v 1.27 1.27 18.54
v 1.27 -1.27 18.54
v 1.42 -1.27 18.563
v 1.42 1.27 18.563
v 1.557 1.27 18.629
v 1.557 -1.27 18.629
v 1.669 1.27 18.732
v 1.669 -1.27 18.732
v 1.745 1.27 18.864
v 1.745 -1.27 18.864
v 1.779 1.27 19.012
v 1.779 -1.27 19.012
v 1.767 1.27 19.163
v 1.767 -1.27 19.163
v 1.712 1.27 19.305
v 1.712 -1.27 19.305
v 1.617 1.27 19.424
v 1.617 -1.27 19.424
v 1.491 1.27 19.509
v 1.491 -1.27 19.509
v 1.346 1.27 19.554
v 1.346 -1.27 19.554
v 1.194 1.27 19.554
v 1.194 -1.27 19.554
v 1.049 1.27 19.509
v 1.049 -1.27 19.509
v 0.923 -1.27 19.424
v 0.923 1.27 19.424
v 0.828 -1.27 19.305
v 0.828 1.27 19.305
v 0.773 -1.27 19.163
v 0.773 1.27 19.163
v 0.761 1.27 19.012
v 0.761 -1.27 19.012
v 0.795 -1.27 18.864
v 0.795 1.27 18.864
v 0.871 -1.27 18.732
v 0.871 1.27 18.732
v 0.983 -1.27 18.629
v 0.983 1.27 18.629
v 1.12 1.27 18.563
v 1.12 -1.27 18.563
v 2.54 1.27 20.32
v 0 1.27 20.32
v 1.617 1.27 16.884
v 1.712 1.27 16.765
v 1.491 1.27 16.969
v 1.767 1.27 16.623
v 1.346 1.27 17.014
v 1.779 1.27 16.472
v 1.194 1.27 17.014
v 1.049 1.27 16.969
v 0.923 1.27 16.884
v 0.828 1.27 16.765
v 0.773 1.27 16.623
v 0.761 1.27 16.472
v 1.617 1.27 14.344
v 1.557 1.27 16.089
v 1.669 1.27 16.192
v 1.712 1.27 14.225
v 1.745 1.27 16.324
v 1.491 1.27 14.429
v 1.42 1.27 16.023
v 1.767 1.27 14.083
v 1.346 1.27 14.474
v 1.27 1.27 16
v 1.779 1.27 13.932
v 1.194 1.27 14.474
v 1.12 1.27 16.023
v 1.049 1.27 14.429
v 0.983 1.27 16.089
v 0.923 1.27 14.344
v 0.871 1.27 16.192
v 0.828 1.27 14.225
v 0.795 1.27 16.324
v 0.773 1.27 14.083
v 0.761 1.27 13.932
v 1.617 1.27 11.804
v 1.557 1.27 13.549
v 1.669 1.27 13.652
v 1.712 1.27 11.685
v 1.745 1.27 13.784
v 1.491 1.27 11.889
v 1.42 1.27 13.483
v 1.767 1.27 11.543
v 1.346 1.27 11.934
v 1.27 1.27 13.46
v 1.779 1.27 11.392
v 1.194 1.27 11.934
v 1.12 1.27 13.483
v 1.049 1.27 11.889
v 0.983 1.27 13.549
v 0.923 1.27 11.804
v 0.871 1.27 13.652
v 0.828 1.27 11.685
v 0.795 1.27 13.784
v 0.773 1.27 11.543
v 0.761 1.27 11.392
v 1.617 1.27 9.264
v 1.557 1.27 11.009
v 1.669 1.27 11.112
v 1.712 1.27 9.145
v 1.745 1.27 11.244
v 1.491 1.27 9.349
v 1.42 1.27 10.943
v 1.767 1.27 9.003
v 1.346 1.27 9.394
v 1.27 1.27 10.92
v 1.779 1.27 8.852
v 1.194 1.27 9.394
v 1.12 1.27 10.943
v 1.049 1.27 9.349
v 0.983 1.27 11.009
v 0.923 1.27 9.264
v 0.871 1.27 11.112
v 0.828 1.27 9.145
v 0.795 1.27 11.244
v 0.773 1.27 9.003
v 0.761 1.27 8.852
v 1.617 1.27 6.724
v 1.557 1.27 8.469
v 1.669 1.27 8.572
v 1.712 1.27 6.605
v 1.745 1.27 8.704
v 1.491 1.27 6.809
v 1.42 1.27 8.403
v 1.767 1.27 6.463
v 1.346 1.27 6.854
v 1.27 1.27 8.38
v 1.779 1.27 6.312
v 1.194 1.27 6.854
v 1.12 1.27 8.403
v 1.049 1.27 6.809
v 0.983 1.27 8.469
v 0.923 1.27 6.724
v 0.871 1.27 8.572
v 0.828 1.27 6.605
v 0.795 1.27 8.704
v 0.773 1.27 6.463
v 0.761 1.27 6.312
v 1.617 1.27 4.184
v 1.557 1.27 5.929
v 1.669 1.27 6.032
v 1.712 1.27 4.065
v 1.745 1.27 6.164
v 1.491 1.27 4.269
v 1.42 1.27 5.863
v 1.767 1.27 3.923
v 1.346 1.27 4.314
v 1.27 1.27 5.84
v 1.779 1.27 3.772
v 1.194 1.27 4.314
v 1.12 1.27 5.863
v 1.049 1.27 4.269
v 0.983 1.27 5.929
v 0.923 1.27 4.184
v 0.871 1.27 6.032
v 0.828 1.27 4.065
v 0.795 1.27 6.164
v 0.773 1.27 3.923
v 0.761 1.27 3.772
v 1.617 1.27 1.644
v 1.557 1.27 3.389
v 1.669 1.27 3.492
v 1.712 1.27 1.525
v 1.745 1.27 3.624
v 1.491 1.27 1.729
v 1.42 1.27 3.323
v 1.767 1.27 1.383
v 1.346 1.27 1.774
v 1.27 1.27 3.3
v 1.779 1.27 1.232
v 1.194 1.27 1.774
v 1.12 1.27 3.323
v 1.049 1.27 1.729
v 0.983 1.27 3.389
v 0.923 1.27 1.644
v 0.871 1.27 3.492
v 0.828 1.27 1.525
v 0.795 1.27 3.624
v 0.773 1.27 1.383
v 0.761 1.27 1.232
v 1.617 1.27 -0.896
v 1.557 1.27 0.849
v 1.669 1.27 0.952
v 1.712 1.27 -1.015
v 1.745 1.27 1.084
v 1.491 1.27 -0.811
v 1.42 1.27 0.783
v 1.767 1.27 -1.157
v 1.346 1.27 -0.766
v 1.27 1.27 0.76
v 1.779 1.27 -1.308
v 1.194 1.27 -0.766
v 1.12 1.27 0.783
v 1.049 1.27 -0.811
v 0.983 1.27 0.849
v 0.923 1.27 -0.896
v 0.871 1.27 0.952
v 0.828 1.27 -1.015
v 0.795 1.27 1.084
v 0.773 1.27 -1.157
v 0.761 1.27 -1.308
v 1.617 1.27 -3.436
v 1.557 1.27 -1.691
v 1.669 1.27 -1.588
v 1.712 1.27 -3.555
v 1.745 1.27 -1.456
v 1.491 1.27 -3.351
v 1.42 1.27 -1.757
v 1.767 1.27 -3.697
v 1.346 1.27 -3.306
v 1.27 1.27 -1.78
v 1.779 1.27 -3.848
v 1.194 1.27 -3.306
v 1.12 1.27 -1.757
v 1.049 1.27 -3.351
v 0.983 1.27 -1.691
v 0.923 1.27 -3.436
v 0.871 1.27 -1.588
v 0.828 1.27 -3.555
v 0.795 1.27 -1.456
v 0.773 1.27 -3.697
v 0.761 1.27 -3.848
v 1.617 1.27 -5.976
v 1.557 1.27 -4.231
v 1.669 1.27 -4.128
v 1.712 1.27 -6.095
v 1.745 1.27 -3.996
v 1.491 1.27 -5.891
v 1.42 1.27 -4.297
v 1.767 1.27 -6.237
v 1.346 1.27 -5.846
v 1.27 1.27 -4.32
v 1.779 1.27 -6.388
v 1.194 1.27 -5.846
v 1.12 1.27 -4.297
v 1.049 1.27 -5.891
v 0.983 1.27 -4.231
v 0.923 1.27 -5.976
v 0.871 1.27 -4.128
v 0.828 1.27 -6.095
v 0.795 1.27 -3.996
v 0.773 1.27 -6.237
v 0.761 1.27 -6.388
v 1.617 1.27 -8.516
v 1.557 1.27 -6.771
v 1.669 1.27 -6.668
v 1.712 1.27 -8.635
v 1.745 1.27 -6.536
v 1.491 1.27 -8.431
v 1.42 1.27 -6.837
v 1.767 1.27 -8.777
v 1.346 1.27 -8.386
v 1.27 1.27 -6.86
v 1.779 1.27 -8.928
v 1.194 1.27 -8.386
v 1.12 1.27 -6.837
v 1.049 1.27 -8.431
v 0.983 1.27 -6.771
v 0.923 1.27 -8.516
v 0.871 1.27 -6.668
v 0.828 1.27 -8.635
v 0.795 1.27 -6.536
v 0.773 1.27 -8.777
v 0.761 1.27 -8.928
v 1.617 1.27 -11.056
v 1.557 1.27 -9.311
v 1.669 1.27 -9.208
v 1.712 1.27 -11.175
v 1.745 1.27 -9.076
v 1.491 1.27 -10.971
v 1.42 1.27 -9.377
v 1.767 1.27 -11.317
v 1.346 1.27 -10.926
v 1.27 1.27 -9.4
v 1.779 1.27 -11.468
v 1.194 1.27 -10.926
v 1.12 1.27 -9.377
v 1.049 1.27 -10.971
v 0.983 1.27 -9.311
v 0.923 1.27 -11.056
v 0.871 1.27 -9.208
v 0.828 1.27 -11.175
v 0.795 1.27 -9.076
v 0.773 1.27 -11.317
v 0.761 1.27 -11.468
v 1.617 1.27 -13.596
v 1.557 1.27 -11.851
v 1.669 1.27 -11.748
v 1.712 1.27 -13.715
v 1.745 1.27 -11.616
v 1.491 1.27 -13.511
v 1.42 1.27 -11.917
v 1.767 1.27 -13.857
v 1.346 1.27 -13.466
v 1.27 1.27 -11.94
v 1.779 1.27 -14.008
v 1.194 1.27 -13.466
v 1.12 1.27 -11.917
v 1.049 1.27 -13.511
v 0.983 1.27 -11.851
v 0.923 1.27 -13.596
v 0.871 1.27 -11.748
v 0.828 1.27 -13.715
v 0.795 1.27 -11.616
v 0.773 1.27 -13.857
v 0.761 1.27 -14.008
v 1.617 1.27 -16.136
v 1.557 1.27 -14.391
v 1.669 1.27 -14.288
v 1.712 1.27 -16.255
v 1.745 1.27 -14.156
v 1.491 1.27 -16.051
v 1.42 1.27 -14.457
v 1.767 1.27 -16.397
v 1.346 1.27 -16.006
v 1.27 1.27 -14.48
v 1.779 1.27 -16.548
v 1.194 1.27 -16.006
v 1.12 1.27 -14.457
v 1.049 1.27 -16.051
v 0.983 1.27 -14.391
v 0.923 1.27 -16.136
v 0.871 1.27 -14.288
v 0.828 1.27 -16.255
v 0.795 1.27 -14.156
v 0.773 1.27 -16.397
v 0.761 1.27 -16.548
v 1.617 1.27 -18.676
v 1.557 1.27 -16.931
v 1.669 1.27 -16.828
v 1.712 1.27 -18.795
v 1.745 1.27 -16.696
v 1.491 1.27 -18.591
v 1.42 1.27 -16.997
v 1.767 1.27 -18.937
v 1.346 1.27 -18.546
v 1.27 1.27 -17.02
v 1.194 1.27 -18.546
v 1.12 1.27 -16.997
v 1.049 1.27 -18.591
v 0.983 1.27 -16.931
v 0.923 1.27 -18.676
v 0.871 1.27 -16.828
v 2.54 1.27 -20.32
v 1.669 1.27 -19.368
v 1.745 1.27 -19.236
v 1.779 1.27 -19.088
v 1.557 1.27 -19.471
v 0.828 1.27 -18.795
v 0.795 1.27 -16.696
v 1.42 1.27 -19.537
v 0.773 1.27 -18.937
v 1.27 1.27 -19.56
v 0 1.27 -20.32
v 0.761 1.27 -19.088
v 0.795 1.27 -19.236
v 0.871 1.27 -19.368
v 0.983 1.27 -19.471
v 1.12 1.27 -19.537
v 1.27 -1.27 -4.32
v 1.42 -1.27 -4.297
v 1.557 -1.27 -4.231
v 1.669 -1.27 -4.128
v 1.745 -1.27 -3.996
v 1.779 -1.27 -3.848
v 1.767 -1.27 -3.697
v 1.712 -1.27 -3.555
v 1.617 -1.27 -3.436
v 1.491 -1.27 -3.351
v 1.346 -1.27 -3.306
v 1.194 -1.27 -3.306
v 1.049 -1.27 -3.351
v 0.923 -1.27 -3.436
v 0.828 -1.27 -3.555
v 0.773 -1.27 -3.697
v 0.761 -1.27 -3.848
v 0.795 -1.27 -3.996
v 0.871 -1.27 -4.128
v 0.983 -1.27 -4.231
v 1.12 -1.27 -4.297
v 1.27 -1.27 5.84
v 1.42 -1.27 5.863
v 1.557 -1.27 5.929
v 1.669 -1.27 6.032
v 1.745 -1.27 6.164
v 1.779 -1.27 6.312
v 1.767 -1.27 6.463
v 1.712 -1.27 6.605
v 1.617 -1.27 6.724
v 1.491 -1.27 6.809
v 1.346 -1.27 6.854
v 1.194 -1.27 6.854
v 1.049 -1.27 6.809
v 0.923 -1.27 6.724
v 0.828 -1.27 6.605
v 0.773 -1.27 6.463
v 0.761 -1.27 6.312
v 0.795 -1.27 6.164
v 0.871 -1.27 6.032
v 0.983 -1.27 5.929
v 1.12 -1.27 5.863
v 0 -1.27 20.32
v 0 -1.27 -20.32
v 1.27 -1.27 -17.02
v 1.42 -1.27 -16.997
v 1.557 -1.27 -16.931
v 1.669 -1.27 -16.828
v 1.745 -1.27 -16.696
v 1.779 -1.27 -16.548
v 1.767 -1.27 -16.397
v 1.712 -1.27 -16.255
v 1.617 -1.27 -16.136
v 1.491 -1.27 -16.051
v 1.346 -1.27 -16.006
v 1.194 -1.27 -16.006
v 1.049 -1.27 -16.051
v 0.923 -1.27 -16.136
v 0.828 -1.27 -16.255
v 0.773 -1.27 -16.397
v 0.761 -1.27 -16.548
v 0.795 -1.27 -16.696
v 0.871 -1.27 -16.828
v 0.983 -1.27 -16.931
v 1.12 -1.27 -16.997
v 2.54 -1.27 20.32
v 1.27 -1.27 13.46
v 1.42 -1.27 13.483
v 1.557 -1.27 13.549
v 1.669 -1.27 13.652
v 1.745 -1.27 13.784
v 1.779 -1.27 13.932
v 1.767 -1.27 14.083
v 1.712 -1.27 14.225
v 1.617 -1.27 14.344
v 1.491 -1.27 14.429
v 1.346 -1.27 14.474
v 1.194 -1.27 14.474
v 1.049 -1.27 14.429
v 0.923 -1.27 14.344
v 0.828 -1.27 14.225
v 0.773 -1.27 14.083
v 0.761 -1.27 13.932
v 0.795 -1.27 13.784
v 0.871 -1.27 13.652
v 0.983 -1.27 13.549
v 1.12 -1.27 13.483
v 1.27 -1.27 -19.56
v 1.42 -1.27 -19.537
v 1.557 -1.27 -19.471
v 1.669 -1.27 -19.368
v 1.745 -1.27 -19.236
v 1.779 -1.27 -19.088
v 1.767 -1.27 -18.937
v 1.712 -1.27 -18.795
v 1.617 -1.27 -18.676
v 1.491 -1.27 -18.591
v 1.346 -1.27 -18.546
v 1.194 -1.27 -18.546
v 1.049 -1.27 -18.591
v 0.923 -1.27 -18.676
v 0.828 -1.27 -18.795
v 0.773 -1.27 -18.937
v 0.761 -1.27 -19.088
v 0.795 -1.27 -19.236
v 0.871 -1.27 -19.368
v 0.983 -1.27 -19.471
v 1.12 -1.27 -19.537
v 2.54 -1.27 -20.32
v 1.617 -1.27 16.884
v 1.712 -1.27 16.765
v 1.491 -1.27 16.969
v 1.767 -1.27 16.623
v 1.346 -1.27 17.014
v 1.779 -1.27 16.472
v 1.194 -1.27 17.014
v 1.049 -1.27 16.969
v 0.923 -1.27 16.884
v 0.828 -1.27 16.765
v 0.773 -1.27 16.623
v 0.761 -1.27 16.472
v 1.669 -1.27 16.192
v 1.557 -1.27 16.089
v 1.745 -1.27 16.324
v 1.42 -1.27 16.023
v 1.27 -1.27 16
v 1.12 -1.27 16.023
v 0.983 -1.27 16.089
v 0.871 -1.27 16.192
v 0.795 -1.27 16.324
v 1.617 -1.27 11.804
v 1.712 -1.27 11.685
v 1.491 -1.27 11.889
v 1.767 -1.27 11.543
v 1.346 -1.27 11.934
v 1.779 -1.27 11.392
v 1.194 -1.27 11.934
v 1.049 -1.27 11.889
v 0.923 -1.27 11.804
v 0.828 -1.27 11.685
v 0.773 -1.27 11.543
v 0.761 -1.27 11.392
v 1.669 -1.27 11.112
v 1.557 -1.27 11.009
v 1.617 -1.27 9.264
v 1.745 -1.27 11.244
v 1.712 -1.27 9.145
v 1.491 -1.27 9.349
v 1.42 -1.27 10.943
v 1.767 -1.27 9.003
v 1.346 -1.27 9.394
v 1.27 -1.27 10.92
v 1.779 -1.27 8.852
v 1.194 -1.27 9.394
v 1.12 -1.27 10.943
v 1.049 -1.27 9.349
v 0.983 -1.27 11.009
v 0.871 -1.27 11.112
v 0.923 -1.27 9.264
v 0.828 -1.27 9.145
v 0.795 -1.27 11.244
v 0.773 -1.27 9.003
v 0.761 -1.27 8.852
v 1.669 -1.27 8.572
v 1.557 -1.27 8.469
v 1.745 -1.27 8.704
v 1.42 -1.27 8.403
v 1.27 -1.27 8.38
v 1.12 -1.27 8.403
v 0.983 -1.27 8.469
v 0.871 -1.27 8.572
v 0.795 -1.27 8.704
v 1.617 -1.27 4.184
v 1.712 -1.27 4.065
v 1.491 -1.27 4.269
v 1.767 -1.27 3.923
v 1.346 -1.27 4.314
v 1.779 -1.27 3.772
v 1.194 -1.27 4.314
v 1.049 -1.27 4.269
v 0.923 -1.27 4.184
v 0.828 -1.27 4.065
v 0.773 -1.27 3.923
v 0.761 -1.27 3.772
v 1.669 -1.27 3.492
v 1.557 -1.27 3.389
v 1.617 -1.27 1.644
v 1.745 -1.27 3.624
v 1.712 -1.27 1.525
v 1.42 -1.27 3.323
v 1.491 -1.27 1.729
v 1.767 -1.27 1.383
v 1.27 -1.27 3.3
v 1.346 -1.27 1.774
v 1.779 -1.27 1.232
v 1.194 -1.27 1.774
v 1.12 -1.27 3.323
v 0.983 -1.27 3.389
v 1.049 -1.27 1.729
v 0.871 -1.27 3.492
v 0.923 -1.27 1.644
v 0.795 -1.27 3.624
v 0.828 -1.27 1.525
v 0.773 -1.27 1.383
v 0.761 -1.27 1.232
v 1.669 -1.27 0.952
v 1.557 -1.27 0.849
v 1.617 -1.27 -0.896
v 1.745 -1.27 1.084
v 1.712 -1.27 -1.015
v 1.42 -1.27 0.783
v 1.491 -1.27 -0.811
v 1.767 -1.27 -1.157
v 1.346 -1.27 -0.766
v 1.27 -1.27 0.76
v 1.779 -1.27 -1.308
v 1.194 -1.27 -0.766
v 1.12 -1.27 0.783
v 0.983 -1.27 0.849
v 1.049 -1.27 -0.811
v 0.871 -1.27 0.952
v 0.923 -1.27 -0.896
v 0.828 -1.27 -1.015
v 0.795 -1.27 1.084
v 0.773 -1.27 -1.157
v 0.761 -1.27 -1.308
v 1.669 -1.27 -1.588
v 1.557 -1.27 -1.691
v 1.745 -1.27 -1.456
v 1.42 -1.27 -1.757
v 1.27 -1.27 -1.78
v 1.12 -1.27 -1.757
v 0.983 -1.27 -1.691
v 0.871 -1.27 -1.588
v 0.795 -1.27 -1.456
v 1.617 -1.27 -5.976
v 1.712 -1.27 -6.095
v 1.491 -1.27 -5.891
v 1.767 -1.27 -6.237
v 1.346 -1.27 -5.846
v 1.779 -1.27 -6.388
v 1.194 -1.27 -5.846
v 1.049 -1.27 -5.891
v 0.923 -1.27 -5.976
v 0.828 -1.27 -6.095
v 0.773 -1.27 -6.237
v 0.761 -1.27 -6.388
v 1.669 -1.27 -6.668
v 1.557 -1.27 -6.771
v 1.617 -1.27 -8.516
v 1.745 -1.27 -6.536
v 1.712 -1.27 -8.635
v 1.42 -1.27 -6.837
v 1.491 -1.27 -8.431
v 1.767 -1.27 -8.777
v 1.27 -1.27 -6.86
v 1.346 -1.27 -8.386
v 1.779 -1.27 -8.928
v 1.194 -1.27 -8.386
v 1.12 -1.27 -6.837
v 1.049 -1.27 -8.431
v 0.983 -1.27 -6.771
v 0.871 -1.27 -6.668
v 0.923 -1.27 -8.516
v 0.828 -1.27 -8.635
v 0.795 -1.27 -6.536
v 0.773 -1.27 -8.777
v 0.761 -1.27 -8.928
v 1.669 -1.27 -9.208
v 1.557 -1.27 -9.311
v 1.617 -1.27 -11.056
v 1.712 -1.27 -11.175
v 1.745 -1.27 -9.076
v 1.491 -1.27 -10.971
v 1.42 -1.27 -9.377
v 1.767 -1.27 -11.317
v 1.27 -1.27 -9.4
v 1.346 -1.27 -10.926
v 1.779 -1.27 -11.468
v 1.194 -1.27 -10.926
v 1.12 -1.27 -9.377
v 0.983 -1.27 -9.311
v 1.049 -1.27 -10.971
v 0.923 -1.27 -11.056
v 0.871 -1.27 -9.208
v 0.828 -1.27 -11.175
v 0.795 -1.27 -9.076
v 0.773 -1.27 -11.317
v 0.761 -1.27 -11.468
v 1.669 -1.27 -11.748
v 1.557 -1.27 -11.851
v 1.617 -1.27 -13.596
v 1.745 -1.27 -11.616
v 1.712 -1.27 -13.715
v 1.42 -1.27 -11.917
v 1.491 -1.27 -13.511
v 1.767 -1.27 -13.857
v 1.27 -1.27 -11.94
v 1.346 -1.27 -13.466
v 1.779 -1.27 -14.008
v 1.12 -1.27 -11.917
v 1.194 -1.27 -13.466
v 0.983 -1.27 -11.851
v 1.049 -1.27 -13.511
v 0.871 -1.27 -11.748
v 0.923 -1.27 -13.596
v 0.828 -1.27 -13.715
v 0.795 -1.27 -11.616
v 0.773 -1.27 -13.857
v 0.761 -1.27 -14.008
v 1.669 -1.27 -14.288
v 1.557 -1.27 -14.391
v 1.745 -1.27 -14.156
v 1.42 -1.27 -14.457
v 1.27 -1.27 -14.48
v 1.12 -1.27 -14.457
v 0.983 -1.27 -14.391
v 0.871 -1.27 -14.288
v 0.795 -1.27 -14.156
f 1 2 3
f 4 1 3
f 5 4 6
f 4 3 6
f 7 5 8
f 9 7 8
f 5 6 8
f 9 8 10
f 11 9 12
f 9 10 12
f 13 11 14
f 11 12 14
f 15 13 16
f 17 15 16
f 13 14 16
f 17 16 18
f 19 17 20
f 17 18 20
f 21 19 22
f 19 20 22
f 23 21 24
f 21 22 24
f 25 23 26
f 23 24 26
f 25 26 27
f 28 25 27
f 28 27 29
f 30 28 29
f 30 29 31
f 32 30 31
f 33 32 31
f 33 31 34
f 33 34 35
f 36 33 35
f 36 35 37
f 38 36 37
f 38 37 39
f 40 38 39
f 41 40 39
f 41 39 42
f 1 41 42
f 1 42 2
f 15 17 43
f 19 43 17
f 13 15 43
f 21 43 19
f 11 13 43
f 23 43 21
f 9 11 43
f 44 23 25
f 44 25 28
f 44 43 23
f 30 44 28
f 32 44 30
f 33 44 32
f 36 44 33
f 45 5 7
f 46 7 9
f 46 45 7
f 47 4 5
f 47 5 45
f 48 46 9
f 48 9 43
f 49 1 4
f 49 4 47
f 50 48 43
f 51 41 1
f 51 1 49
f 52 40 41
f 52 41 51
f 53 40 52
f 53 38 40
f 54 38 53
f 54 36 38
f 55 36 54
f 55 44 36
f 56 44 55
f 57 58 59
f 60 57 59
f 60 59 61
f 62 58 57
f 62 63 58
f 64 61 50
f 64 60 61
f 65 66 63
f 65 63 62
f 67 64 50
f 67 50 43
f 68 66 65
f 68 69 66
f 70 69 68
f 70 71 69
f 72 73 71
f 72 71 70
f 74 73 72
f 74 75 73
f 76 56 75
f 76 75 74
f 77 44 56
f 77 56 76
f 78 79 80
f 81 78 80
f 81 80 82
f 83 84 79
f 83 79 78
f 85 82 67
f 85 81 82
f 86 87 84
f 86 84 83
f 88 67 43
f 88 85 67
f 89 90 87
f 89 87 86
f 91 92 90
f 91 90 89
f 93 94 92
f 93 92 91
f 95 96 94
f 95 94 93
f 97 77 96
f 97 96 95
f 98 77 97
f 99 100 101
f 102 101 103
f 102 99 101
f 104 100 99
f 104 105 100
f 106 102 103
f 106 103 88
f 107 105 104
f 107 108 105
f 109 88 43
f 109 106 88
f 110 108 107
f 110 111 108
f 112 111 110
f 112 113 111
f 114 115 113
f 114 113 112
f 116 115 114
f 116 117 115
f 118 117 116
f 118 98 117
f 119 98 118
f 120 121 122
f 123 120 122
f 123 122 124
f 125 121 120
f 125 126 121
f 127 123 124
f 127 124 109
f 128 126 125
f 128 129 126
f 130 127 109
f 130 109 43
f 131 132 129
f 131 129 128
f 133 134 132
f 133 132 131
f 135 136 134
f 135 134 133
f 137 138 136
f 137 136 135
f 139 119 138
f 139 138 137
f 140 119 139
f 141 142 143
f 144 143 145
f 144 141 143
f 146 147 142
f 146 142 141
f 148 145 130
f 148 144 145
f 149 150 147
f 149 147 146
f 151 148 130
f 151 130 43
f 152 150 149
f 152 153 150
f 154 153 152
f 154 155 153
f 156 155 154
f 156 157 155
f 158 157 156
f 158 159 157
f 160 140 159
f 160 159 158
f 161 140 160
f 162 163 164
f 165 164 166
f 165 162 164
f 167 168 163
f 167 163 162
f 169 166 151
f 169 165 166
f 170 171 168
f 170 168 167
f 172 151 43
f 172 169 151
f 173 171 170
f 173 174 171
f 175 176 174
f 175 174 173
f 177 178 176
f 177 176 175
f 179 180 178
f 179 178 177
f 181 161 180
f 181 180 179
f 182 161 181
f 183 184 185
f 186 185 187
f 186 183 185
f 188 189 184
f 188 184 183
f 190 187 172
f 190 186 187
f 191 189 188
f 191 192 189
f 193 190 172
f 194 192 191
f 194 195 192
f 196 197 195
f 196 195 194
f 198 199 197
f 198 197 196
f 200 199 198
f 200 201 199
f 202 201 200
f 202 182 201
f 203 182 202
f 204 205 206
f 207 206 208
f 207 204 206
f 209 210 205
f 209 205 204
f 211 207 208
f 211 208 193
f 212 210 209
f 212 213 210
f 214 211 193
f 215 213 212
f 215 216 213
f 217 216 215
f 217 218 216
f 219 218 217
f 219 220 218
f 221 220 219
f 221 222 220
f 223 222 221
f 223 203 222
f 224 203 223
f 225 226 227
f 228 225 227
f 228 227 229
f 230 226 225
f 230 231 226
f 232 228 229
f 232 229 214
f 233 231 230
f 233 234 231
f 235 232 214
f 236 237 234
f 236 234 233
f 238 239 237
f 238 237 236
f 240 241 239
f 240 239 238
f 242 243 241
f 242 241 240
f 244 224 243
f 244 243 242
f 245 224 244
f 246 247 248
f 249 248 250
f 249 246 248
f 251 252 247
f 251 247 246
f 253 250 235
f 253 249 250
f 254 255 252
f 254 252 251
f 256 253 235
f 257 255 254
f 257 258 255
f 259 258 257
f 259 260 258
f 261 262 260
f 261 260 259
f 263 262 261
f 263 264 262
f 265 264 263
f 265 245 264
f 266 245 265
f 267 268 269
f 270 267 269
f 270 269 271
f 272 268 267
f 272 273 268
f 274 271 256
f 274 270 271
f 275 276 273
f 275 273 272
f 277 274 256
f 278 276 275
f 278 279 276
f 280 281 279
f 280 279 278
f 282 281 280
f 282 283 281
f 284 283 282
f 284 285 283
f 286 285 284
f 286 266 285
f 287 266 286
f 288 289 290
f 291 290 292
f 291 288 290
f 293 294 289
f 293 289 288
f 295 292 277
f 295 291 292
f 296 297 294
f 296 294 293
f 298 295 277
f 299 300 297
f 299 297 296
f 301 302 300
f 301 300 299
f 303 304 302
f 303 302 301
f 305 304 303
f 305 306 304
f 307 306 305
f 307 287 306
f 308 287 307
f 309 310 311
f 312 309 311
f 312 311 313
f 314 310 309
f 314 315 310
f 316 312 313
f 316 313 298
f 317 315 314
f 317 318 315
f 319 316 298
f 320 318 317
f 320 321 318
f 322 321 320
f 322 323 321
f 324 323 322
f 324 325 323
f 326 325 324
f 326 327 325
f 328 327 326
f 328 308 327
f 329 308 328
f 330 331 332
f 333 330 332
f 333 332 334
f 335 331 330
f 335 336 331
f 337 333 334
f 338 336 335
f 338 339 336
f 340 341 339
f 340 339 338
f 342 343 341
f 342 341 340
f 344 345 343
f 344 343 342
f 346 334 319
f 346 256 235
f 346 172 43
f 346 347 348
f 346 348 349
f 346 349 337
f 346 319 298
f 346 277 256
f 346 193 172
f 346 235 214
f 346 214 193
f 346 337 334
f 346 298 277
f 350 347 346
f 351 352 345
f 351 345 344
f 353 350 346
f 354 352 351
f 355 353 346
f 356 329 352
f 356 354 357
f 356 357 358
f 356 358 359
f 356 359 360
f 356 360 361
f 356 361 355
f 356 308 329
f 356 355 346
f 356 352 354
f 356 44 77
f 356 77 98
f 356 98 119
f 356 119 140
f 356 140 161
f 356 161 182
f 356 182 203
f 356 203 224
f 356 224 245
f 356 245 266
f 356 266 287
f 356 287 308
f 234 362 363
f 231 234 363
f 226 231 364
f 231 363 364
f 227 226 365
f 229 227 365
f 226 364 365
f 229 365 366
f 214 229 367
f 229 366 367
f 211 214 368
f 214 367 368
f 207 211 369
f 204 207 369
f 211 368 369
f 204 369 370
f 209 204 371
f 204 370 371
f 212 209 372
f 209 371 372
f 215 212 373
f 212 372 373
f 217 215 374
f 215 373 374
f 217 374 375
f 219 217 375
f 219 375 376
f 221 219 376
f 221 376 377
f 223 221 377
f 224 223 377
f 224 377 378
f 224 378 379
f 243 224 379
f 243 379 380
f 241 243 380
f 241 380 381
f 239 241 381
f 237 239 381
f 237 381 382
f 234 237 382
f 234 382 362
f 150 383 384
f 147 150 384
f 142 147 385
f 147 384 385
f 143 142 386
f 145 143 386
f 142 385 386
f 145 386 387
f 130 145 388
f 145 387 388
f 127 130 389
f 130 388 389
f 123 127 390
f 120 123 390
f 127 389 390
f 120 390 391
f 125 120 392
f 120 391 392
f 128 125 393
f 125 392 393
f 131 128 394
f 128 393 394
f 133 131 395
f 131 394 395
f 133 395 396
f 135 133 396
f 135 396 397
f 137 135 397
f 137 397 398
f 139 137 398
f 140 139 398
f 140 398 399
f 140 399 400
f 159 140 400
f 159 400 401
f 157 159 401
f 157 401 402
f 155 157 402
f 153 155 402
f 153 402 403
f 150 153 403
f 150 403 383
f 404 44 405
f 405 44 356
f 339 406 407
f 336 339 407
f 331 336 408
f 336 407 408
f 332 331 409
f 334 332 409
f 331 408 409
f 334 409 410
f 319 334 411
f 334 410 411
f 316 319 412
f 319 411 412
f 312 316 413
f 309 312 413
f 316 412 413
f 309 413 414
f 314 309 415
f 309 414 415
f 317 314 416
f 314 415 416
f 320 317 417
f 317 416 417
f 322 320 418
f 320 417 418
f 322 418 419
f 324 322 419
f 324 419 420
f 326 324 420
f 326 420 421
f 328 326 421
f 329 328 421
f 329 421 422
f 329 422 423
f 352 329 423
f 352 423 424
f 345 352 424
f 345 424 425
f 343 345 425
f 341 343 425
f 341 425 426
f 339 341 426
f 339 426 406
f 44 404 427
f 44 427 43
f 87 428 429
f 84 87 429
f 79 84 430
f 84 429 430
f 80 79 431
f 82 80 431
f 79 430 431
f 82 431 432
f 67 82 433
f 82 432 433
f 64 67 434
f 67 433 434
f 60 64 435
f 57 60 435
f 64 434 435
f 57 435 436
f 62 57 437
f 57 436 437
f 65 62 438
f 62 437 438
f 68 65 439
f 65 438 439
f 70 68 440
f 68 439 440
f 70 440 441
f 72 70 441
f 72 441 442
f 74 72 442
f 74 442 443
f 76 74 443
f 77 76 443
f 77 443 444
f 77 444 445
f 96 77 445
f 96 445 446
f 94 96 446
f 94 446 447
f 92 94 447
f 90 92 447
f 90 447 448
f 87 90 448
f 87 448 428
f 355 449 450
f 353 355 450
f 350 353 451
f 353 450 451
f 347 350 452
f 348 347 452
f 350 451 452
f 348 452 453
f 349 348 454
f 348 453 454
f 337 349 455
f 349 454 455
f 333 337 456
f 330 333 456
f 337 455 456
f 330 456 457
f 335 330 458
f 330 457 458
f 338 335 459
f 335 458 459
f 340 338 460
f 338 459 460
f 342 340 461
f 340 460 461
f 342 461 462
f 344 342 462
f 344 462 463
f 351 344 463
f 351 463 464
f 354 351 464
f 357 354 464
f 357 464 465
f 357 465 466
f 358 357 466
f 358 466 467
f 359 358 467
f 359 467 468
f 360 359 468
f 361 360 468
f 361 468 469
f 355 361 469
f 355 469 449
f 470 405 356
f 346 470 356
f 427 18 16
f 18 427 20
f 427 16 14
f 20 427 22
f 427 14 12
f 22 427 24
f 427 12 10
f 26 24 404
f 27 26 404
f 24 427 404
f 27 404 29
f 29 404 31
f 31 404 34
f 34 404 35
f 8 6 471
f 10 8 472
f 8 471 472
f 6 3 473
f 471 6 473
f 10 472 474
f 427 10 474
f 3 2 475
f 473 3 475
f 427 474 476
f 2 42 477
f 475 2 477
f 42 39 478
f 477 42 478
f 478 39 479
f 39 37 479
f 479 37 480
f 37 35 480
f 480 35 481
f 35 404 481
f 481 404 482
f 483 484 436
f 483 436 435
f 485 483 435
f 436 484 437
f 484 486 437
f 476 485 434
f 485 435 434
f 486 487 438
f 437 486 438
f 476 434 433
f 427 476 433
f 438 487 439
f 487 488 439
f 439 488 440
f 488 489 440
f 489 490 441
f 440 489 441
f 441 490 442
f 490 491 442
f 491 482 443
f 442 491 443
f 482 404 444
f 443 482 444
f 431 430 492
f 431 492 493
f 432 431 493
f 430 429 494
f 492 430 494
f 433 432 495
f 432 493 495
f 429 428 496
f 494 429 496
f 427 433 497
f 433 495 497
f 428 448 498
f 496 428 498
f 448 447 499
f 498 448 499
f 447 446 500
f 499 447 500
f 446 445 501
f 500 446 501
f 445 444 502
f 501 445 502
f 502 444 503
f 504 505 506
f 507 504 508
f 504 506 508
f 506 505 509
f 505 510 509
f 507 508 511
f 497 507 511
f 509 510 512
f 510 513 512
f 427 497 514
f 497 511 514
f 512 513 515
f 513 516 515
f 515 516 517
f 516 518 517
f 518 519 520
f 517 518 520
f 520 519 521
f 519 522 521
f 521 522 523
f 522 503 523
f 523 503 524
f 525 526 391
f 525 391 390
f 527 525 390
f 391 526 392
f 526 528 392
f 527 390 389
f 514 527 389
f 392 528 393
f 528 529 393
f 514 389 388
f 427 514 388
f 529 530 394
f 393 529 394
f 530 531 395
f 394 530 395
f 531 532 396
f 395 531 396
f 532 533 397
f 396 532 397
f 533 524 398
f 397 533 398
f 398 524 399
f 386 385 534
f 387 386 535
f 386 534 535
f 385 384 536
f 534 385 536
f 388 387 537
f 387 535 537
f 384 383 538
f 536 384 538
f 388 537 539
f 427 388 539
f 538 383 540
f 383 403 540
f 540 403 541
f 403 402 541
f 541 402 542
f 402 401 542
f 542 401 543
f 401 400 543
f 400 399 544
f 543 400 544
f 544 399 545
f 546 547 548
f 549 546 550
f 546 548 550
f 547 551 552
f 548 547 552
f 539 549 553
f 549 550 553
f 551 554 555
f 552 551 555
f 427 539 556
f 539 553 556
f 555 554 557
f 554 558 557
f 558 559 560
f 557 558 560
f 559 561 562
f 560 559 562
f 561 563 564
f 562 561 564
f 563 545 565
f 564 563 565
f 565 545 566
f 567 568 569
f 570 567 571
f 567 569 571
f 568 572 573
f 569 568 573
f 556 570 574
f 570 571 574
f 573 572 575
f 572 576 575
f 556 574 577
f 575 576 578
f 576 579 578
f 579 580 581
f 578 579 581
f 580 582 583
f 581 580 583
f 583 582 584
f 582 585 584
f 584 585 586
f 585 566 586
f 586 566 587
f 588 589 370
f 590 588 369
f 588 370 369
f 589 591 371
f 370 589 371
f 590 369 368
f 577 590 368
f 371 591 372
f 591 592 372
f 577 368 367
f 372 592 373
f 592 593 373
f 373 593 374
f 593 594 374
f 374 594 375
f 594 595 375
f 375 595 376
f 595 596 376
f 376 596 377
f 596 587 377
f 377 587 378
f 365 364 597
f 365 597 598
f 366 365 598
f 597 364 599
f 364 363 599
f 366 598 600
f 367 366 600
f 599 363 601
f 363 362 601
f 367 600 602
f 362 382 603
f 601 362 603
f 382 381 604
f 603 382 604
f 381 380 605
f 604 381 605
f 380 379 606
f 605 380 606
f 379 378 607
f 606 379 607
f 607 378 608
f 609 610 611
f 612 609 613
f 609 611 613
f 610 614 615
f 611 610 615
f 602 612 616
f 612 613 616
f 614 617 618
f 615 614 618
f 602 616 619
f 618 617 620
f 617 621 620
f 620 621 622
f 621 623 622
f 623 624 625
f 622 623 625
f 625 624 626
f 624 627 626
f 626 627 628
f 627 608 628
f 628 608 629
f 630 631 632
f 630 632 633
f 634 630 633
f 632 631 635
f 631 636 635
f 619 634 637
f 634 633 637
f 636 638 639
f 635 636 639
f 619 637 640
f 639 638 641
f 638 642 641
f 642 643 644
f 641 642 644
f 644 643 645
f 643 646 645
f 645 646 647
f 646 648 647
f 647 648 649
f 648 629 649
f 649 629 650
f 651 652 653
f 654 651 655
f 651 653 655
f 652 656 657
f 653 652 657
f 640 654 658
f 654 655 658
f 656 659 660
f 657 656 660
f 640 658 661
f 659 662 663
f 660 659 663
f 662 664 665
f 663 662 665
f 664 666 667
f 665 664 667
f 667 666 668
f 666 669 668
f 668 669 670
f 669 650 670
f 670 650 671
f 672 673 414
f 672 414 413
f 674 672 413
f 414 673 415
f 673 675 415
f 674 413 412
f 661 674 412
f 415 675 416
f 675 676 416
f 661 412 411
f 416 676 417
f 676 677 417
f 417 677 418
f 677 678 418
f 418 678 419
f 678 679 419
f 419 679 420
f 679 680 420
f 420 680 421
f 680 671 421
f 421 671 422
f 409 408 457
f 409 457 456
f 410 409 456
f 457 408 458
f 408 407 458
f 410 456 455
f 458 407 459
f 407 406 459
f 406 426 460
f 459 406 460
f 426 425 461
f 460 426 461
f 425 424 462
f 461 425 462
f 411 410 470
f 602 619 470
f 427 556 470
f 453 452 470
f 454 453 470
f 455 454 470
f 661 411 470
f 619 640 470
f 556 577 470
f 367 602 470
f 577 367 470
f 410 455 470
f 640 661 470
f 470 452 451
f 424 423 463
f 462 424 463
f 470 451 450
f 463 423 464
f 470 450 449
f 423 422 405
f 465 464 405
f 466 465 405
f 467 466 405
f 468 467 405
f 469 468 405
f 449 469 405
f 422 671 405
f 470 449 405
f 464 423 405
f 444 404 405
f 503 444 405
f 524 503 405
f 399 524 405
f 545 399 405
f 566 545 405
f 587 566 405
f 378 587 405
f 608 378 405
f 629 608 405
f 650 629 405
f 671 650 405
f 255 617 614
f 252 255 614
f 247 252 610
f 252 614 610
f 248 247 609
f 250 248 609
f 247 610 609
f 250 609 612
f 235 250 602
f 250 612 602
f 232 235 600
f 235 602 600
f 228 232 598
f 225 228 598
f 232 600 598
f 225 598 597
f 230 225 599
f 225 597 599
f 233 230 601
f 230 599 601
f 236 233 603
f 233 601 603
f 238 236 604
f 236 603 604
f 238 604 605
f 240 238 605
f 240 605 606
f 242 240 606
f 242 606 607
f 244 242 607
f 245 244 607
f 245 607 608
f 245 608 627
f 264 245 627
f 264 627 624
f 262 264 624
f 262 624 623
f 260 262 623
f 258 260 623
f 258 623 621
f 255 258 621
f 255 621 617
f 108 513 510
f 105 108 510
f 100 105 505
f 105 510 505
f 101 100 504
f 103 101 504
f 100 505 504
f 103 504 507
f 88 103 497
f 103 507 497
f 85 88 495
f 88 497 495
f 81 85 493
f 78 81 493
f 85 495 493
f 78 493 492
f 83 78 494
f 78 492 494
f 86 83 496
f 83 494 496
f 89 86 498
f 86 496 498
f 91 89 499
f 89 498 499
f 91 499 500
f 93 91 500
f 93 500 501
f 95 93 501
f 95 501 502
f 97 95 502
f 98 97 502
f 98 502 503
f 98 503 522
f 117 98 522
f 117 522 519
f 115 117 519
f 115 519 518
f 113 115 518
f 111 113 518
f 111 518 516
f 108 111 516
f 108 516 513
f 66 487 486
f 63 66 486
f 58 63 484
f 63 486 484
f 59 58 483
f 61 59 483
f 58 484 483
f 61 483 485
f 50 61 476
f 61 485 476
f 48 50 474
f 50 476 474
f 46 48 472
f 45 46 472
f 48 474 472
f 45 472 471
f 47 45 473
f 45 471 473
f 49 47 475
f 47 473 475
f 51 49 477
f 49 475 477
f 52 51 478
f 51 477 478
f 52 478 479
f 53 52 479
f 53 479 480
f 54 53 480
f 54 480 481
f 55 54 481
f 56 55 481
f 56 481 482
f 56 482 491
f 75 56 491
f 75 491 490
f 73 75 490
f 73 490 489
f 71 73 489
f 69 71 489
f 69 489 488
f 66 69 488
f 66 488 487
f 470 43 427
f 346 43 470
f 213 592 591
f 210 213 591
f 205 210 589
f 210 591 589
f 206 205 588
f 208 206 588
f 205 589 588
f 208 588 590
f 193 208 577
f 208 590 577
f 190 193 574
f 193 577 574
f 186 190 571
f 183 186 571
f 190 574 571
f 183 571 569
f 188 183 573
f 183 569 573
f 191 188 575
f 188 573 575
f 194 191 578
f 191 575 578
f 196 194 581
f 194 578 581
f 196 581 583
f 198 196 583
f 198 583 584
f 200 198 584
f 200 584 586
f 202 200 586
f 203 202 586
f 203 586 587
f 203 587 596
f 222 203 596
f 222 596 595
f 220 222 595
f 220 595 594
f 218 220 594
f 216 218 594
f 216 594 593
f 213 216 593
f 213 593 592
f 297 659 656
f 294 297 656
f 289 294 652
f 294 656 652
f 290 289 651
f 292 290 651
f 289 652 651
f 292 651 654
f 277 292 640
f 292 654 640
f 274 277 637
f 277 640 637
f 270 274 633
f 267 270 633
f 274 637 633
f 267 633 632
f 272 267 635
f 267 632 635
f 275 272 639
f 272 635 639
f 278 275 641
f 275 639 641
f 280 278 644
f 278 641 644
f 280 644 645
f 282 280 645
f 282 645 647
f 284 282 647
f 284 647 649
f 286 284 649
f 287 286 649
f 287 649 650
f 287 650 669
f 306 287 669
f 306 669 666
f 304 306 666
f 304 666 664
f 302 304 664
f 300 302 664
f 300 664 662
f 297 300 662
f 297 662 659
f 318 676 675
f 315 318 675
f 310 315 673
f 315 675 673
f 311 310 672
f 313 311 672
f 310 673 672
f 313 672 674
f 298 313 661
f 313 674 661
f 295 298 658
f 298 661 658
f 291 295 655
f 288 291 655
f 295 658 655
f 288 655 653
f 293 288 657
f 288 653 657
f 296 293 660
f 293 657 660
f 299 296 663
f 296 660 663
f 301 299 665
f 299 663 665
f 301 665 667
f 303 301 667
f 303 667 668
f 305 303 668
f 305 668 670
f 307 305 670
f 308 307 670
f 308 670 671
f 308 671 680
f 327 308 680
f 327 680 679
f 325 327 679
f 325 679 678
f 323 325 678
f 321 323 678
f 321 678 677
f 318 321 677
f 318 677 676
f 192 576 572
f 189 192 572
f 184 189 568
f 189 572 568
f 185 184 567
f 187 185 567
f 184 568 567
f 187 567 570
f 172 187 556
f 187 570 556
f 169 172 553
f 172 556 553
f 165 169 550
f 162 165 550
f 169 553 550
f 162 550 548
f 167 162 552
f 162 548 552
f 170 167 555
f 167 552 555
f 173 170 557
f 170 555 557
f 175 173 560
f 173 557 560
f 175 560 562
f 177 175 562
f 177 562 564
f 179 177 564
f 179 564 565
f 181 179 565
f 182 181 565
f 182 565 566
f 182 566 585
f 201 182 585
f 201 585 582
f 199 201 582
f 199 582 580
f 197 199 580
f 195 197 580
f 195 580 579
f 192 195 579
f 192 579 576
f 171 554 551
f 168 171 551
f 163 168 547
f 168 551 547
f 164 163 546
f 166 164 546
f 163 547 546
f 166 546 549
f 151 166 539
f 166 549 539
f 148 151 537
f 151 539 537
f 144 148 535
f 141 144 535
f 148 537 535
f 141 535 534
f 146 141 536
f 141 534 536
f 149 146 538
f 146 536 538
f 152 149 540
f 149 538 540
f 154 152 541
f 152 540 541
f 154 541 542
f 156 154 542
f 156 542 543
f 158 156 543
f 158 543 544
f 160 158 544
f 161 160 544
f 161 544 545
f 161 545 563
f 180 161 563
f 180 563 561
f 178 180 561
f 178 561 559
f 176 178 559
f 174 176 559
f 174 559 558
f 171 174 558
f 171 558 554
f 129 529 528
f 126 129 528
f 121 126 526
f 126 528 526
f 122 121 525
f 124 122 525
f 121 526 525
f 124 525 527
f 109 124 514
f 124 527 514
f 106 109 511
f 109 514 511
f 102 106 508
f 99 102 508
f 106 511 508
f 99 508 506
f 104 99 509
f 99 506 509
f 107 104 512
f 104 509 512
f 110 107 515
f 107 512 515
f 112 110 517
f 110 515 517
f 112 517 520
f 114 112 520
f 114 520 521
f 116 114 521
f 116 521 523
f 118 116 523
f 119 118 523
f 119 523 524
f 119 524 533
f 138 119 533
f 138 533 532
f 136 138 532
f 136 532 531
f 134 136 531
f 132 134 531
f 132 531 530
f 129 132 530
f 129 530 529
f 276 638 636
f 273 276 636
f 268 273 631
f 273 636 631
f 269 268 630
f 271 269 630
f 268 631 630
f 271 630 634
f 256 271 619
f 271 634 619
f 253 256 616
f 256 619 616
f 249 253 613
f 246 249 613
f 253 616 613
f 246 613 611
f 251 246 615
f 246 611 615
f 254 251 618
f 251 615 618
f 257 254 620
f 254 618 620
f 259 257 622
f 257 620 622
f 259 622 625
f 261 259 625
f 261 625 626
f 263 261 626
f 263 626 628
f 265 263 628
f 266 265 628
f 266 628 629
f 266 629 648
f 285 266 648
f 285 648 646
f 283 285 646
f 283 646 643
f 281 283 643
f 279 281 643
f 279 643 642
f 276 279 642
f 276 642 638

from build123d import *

# Parameters (mm, degrees)
SKETCH1_W             = 40.64
SKETCH1_H             = 2.54
BOSS_EXTRUDE1_DEPTH   = 2.54
F_1_0MM_DOWEL_HOLE1_D = 1.02
LPATTERN1_COUNT       = 16
LPATTERN1_PITCH       = 2.54


with BuildPart() as part:
    # Sketch1 → Boss-Extrude1 (new body)
    with BuildSketch(Plane(origin=(0, 0, 0), x_dir=(0, 0, -1), z_dir=(1, 0, 0))):
        Rectangle(SKETCH1_W, SKETCH1_H)
    extrude(amount=BOSS_EXTRUDE1_DEPTH)

    # Ø1.0mm Dowel Hole1 (through all)
    with Locations(Plane(origin=(1.27, 1.27, 19.05), x_dir=(0, 0, 1), z_dir=(0, 1, 0))):
        with Locations((0, 0)):
            f_1_0mm_dowel_hole1 = Hole(F_1_0MM_DOWEL_HOLE1_D / 2)

    # LPattern1: Ø1.0mm Dowel Hole1 ×16
    with Locations(*[(0, 0, -i * LPATTERN1_PITCH) for i in range(1, LPATTERN1_COUNT)]):
        add(f_1_0mm_dowel_hole1, mode=Mode.SUBTRACT)


solid = part.part
